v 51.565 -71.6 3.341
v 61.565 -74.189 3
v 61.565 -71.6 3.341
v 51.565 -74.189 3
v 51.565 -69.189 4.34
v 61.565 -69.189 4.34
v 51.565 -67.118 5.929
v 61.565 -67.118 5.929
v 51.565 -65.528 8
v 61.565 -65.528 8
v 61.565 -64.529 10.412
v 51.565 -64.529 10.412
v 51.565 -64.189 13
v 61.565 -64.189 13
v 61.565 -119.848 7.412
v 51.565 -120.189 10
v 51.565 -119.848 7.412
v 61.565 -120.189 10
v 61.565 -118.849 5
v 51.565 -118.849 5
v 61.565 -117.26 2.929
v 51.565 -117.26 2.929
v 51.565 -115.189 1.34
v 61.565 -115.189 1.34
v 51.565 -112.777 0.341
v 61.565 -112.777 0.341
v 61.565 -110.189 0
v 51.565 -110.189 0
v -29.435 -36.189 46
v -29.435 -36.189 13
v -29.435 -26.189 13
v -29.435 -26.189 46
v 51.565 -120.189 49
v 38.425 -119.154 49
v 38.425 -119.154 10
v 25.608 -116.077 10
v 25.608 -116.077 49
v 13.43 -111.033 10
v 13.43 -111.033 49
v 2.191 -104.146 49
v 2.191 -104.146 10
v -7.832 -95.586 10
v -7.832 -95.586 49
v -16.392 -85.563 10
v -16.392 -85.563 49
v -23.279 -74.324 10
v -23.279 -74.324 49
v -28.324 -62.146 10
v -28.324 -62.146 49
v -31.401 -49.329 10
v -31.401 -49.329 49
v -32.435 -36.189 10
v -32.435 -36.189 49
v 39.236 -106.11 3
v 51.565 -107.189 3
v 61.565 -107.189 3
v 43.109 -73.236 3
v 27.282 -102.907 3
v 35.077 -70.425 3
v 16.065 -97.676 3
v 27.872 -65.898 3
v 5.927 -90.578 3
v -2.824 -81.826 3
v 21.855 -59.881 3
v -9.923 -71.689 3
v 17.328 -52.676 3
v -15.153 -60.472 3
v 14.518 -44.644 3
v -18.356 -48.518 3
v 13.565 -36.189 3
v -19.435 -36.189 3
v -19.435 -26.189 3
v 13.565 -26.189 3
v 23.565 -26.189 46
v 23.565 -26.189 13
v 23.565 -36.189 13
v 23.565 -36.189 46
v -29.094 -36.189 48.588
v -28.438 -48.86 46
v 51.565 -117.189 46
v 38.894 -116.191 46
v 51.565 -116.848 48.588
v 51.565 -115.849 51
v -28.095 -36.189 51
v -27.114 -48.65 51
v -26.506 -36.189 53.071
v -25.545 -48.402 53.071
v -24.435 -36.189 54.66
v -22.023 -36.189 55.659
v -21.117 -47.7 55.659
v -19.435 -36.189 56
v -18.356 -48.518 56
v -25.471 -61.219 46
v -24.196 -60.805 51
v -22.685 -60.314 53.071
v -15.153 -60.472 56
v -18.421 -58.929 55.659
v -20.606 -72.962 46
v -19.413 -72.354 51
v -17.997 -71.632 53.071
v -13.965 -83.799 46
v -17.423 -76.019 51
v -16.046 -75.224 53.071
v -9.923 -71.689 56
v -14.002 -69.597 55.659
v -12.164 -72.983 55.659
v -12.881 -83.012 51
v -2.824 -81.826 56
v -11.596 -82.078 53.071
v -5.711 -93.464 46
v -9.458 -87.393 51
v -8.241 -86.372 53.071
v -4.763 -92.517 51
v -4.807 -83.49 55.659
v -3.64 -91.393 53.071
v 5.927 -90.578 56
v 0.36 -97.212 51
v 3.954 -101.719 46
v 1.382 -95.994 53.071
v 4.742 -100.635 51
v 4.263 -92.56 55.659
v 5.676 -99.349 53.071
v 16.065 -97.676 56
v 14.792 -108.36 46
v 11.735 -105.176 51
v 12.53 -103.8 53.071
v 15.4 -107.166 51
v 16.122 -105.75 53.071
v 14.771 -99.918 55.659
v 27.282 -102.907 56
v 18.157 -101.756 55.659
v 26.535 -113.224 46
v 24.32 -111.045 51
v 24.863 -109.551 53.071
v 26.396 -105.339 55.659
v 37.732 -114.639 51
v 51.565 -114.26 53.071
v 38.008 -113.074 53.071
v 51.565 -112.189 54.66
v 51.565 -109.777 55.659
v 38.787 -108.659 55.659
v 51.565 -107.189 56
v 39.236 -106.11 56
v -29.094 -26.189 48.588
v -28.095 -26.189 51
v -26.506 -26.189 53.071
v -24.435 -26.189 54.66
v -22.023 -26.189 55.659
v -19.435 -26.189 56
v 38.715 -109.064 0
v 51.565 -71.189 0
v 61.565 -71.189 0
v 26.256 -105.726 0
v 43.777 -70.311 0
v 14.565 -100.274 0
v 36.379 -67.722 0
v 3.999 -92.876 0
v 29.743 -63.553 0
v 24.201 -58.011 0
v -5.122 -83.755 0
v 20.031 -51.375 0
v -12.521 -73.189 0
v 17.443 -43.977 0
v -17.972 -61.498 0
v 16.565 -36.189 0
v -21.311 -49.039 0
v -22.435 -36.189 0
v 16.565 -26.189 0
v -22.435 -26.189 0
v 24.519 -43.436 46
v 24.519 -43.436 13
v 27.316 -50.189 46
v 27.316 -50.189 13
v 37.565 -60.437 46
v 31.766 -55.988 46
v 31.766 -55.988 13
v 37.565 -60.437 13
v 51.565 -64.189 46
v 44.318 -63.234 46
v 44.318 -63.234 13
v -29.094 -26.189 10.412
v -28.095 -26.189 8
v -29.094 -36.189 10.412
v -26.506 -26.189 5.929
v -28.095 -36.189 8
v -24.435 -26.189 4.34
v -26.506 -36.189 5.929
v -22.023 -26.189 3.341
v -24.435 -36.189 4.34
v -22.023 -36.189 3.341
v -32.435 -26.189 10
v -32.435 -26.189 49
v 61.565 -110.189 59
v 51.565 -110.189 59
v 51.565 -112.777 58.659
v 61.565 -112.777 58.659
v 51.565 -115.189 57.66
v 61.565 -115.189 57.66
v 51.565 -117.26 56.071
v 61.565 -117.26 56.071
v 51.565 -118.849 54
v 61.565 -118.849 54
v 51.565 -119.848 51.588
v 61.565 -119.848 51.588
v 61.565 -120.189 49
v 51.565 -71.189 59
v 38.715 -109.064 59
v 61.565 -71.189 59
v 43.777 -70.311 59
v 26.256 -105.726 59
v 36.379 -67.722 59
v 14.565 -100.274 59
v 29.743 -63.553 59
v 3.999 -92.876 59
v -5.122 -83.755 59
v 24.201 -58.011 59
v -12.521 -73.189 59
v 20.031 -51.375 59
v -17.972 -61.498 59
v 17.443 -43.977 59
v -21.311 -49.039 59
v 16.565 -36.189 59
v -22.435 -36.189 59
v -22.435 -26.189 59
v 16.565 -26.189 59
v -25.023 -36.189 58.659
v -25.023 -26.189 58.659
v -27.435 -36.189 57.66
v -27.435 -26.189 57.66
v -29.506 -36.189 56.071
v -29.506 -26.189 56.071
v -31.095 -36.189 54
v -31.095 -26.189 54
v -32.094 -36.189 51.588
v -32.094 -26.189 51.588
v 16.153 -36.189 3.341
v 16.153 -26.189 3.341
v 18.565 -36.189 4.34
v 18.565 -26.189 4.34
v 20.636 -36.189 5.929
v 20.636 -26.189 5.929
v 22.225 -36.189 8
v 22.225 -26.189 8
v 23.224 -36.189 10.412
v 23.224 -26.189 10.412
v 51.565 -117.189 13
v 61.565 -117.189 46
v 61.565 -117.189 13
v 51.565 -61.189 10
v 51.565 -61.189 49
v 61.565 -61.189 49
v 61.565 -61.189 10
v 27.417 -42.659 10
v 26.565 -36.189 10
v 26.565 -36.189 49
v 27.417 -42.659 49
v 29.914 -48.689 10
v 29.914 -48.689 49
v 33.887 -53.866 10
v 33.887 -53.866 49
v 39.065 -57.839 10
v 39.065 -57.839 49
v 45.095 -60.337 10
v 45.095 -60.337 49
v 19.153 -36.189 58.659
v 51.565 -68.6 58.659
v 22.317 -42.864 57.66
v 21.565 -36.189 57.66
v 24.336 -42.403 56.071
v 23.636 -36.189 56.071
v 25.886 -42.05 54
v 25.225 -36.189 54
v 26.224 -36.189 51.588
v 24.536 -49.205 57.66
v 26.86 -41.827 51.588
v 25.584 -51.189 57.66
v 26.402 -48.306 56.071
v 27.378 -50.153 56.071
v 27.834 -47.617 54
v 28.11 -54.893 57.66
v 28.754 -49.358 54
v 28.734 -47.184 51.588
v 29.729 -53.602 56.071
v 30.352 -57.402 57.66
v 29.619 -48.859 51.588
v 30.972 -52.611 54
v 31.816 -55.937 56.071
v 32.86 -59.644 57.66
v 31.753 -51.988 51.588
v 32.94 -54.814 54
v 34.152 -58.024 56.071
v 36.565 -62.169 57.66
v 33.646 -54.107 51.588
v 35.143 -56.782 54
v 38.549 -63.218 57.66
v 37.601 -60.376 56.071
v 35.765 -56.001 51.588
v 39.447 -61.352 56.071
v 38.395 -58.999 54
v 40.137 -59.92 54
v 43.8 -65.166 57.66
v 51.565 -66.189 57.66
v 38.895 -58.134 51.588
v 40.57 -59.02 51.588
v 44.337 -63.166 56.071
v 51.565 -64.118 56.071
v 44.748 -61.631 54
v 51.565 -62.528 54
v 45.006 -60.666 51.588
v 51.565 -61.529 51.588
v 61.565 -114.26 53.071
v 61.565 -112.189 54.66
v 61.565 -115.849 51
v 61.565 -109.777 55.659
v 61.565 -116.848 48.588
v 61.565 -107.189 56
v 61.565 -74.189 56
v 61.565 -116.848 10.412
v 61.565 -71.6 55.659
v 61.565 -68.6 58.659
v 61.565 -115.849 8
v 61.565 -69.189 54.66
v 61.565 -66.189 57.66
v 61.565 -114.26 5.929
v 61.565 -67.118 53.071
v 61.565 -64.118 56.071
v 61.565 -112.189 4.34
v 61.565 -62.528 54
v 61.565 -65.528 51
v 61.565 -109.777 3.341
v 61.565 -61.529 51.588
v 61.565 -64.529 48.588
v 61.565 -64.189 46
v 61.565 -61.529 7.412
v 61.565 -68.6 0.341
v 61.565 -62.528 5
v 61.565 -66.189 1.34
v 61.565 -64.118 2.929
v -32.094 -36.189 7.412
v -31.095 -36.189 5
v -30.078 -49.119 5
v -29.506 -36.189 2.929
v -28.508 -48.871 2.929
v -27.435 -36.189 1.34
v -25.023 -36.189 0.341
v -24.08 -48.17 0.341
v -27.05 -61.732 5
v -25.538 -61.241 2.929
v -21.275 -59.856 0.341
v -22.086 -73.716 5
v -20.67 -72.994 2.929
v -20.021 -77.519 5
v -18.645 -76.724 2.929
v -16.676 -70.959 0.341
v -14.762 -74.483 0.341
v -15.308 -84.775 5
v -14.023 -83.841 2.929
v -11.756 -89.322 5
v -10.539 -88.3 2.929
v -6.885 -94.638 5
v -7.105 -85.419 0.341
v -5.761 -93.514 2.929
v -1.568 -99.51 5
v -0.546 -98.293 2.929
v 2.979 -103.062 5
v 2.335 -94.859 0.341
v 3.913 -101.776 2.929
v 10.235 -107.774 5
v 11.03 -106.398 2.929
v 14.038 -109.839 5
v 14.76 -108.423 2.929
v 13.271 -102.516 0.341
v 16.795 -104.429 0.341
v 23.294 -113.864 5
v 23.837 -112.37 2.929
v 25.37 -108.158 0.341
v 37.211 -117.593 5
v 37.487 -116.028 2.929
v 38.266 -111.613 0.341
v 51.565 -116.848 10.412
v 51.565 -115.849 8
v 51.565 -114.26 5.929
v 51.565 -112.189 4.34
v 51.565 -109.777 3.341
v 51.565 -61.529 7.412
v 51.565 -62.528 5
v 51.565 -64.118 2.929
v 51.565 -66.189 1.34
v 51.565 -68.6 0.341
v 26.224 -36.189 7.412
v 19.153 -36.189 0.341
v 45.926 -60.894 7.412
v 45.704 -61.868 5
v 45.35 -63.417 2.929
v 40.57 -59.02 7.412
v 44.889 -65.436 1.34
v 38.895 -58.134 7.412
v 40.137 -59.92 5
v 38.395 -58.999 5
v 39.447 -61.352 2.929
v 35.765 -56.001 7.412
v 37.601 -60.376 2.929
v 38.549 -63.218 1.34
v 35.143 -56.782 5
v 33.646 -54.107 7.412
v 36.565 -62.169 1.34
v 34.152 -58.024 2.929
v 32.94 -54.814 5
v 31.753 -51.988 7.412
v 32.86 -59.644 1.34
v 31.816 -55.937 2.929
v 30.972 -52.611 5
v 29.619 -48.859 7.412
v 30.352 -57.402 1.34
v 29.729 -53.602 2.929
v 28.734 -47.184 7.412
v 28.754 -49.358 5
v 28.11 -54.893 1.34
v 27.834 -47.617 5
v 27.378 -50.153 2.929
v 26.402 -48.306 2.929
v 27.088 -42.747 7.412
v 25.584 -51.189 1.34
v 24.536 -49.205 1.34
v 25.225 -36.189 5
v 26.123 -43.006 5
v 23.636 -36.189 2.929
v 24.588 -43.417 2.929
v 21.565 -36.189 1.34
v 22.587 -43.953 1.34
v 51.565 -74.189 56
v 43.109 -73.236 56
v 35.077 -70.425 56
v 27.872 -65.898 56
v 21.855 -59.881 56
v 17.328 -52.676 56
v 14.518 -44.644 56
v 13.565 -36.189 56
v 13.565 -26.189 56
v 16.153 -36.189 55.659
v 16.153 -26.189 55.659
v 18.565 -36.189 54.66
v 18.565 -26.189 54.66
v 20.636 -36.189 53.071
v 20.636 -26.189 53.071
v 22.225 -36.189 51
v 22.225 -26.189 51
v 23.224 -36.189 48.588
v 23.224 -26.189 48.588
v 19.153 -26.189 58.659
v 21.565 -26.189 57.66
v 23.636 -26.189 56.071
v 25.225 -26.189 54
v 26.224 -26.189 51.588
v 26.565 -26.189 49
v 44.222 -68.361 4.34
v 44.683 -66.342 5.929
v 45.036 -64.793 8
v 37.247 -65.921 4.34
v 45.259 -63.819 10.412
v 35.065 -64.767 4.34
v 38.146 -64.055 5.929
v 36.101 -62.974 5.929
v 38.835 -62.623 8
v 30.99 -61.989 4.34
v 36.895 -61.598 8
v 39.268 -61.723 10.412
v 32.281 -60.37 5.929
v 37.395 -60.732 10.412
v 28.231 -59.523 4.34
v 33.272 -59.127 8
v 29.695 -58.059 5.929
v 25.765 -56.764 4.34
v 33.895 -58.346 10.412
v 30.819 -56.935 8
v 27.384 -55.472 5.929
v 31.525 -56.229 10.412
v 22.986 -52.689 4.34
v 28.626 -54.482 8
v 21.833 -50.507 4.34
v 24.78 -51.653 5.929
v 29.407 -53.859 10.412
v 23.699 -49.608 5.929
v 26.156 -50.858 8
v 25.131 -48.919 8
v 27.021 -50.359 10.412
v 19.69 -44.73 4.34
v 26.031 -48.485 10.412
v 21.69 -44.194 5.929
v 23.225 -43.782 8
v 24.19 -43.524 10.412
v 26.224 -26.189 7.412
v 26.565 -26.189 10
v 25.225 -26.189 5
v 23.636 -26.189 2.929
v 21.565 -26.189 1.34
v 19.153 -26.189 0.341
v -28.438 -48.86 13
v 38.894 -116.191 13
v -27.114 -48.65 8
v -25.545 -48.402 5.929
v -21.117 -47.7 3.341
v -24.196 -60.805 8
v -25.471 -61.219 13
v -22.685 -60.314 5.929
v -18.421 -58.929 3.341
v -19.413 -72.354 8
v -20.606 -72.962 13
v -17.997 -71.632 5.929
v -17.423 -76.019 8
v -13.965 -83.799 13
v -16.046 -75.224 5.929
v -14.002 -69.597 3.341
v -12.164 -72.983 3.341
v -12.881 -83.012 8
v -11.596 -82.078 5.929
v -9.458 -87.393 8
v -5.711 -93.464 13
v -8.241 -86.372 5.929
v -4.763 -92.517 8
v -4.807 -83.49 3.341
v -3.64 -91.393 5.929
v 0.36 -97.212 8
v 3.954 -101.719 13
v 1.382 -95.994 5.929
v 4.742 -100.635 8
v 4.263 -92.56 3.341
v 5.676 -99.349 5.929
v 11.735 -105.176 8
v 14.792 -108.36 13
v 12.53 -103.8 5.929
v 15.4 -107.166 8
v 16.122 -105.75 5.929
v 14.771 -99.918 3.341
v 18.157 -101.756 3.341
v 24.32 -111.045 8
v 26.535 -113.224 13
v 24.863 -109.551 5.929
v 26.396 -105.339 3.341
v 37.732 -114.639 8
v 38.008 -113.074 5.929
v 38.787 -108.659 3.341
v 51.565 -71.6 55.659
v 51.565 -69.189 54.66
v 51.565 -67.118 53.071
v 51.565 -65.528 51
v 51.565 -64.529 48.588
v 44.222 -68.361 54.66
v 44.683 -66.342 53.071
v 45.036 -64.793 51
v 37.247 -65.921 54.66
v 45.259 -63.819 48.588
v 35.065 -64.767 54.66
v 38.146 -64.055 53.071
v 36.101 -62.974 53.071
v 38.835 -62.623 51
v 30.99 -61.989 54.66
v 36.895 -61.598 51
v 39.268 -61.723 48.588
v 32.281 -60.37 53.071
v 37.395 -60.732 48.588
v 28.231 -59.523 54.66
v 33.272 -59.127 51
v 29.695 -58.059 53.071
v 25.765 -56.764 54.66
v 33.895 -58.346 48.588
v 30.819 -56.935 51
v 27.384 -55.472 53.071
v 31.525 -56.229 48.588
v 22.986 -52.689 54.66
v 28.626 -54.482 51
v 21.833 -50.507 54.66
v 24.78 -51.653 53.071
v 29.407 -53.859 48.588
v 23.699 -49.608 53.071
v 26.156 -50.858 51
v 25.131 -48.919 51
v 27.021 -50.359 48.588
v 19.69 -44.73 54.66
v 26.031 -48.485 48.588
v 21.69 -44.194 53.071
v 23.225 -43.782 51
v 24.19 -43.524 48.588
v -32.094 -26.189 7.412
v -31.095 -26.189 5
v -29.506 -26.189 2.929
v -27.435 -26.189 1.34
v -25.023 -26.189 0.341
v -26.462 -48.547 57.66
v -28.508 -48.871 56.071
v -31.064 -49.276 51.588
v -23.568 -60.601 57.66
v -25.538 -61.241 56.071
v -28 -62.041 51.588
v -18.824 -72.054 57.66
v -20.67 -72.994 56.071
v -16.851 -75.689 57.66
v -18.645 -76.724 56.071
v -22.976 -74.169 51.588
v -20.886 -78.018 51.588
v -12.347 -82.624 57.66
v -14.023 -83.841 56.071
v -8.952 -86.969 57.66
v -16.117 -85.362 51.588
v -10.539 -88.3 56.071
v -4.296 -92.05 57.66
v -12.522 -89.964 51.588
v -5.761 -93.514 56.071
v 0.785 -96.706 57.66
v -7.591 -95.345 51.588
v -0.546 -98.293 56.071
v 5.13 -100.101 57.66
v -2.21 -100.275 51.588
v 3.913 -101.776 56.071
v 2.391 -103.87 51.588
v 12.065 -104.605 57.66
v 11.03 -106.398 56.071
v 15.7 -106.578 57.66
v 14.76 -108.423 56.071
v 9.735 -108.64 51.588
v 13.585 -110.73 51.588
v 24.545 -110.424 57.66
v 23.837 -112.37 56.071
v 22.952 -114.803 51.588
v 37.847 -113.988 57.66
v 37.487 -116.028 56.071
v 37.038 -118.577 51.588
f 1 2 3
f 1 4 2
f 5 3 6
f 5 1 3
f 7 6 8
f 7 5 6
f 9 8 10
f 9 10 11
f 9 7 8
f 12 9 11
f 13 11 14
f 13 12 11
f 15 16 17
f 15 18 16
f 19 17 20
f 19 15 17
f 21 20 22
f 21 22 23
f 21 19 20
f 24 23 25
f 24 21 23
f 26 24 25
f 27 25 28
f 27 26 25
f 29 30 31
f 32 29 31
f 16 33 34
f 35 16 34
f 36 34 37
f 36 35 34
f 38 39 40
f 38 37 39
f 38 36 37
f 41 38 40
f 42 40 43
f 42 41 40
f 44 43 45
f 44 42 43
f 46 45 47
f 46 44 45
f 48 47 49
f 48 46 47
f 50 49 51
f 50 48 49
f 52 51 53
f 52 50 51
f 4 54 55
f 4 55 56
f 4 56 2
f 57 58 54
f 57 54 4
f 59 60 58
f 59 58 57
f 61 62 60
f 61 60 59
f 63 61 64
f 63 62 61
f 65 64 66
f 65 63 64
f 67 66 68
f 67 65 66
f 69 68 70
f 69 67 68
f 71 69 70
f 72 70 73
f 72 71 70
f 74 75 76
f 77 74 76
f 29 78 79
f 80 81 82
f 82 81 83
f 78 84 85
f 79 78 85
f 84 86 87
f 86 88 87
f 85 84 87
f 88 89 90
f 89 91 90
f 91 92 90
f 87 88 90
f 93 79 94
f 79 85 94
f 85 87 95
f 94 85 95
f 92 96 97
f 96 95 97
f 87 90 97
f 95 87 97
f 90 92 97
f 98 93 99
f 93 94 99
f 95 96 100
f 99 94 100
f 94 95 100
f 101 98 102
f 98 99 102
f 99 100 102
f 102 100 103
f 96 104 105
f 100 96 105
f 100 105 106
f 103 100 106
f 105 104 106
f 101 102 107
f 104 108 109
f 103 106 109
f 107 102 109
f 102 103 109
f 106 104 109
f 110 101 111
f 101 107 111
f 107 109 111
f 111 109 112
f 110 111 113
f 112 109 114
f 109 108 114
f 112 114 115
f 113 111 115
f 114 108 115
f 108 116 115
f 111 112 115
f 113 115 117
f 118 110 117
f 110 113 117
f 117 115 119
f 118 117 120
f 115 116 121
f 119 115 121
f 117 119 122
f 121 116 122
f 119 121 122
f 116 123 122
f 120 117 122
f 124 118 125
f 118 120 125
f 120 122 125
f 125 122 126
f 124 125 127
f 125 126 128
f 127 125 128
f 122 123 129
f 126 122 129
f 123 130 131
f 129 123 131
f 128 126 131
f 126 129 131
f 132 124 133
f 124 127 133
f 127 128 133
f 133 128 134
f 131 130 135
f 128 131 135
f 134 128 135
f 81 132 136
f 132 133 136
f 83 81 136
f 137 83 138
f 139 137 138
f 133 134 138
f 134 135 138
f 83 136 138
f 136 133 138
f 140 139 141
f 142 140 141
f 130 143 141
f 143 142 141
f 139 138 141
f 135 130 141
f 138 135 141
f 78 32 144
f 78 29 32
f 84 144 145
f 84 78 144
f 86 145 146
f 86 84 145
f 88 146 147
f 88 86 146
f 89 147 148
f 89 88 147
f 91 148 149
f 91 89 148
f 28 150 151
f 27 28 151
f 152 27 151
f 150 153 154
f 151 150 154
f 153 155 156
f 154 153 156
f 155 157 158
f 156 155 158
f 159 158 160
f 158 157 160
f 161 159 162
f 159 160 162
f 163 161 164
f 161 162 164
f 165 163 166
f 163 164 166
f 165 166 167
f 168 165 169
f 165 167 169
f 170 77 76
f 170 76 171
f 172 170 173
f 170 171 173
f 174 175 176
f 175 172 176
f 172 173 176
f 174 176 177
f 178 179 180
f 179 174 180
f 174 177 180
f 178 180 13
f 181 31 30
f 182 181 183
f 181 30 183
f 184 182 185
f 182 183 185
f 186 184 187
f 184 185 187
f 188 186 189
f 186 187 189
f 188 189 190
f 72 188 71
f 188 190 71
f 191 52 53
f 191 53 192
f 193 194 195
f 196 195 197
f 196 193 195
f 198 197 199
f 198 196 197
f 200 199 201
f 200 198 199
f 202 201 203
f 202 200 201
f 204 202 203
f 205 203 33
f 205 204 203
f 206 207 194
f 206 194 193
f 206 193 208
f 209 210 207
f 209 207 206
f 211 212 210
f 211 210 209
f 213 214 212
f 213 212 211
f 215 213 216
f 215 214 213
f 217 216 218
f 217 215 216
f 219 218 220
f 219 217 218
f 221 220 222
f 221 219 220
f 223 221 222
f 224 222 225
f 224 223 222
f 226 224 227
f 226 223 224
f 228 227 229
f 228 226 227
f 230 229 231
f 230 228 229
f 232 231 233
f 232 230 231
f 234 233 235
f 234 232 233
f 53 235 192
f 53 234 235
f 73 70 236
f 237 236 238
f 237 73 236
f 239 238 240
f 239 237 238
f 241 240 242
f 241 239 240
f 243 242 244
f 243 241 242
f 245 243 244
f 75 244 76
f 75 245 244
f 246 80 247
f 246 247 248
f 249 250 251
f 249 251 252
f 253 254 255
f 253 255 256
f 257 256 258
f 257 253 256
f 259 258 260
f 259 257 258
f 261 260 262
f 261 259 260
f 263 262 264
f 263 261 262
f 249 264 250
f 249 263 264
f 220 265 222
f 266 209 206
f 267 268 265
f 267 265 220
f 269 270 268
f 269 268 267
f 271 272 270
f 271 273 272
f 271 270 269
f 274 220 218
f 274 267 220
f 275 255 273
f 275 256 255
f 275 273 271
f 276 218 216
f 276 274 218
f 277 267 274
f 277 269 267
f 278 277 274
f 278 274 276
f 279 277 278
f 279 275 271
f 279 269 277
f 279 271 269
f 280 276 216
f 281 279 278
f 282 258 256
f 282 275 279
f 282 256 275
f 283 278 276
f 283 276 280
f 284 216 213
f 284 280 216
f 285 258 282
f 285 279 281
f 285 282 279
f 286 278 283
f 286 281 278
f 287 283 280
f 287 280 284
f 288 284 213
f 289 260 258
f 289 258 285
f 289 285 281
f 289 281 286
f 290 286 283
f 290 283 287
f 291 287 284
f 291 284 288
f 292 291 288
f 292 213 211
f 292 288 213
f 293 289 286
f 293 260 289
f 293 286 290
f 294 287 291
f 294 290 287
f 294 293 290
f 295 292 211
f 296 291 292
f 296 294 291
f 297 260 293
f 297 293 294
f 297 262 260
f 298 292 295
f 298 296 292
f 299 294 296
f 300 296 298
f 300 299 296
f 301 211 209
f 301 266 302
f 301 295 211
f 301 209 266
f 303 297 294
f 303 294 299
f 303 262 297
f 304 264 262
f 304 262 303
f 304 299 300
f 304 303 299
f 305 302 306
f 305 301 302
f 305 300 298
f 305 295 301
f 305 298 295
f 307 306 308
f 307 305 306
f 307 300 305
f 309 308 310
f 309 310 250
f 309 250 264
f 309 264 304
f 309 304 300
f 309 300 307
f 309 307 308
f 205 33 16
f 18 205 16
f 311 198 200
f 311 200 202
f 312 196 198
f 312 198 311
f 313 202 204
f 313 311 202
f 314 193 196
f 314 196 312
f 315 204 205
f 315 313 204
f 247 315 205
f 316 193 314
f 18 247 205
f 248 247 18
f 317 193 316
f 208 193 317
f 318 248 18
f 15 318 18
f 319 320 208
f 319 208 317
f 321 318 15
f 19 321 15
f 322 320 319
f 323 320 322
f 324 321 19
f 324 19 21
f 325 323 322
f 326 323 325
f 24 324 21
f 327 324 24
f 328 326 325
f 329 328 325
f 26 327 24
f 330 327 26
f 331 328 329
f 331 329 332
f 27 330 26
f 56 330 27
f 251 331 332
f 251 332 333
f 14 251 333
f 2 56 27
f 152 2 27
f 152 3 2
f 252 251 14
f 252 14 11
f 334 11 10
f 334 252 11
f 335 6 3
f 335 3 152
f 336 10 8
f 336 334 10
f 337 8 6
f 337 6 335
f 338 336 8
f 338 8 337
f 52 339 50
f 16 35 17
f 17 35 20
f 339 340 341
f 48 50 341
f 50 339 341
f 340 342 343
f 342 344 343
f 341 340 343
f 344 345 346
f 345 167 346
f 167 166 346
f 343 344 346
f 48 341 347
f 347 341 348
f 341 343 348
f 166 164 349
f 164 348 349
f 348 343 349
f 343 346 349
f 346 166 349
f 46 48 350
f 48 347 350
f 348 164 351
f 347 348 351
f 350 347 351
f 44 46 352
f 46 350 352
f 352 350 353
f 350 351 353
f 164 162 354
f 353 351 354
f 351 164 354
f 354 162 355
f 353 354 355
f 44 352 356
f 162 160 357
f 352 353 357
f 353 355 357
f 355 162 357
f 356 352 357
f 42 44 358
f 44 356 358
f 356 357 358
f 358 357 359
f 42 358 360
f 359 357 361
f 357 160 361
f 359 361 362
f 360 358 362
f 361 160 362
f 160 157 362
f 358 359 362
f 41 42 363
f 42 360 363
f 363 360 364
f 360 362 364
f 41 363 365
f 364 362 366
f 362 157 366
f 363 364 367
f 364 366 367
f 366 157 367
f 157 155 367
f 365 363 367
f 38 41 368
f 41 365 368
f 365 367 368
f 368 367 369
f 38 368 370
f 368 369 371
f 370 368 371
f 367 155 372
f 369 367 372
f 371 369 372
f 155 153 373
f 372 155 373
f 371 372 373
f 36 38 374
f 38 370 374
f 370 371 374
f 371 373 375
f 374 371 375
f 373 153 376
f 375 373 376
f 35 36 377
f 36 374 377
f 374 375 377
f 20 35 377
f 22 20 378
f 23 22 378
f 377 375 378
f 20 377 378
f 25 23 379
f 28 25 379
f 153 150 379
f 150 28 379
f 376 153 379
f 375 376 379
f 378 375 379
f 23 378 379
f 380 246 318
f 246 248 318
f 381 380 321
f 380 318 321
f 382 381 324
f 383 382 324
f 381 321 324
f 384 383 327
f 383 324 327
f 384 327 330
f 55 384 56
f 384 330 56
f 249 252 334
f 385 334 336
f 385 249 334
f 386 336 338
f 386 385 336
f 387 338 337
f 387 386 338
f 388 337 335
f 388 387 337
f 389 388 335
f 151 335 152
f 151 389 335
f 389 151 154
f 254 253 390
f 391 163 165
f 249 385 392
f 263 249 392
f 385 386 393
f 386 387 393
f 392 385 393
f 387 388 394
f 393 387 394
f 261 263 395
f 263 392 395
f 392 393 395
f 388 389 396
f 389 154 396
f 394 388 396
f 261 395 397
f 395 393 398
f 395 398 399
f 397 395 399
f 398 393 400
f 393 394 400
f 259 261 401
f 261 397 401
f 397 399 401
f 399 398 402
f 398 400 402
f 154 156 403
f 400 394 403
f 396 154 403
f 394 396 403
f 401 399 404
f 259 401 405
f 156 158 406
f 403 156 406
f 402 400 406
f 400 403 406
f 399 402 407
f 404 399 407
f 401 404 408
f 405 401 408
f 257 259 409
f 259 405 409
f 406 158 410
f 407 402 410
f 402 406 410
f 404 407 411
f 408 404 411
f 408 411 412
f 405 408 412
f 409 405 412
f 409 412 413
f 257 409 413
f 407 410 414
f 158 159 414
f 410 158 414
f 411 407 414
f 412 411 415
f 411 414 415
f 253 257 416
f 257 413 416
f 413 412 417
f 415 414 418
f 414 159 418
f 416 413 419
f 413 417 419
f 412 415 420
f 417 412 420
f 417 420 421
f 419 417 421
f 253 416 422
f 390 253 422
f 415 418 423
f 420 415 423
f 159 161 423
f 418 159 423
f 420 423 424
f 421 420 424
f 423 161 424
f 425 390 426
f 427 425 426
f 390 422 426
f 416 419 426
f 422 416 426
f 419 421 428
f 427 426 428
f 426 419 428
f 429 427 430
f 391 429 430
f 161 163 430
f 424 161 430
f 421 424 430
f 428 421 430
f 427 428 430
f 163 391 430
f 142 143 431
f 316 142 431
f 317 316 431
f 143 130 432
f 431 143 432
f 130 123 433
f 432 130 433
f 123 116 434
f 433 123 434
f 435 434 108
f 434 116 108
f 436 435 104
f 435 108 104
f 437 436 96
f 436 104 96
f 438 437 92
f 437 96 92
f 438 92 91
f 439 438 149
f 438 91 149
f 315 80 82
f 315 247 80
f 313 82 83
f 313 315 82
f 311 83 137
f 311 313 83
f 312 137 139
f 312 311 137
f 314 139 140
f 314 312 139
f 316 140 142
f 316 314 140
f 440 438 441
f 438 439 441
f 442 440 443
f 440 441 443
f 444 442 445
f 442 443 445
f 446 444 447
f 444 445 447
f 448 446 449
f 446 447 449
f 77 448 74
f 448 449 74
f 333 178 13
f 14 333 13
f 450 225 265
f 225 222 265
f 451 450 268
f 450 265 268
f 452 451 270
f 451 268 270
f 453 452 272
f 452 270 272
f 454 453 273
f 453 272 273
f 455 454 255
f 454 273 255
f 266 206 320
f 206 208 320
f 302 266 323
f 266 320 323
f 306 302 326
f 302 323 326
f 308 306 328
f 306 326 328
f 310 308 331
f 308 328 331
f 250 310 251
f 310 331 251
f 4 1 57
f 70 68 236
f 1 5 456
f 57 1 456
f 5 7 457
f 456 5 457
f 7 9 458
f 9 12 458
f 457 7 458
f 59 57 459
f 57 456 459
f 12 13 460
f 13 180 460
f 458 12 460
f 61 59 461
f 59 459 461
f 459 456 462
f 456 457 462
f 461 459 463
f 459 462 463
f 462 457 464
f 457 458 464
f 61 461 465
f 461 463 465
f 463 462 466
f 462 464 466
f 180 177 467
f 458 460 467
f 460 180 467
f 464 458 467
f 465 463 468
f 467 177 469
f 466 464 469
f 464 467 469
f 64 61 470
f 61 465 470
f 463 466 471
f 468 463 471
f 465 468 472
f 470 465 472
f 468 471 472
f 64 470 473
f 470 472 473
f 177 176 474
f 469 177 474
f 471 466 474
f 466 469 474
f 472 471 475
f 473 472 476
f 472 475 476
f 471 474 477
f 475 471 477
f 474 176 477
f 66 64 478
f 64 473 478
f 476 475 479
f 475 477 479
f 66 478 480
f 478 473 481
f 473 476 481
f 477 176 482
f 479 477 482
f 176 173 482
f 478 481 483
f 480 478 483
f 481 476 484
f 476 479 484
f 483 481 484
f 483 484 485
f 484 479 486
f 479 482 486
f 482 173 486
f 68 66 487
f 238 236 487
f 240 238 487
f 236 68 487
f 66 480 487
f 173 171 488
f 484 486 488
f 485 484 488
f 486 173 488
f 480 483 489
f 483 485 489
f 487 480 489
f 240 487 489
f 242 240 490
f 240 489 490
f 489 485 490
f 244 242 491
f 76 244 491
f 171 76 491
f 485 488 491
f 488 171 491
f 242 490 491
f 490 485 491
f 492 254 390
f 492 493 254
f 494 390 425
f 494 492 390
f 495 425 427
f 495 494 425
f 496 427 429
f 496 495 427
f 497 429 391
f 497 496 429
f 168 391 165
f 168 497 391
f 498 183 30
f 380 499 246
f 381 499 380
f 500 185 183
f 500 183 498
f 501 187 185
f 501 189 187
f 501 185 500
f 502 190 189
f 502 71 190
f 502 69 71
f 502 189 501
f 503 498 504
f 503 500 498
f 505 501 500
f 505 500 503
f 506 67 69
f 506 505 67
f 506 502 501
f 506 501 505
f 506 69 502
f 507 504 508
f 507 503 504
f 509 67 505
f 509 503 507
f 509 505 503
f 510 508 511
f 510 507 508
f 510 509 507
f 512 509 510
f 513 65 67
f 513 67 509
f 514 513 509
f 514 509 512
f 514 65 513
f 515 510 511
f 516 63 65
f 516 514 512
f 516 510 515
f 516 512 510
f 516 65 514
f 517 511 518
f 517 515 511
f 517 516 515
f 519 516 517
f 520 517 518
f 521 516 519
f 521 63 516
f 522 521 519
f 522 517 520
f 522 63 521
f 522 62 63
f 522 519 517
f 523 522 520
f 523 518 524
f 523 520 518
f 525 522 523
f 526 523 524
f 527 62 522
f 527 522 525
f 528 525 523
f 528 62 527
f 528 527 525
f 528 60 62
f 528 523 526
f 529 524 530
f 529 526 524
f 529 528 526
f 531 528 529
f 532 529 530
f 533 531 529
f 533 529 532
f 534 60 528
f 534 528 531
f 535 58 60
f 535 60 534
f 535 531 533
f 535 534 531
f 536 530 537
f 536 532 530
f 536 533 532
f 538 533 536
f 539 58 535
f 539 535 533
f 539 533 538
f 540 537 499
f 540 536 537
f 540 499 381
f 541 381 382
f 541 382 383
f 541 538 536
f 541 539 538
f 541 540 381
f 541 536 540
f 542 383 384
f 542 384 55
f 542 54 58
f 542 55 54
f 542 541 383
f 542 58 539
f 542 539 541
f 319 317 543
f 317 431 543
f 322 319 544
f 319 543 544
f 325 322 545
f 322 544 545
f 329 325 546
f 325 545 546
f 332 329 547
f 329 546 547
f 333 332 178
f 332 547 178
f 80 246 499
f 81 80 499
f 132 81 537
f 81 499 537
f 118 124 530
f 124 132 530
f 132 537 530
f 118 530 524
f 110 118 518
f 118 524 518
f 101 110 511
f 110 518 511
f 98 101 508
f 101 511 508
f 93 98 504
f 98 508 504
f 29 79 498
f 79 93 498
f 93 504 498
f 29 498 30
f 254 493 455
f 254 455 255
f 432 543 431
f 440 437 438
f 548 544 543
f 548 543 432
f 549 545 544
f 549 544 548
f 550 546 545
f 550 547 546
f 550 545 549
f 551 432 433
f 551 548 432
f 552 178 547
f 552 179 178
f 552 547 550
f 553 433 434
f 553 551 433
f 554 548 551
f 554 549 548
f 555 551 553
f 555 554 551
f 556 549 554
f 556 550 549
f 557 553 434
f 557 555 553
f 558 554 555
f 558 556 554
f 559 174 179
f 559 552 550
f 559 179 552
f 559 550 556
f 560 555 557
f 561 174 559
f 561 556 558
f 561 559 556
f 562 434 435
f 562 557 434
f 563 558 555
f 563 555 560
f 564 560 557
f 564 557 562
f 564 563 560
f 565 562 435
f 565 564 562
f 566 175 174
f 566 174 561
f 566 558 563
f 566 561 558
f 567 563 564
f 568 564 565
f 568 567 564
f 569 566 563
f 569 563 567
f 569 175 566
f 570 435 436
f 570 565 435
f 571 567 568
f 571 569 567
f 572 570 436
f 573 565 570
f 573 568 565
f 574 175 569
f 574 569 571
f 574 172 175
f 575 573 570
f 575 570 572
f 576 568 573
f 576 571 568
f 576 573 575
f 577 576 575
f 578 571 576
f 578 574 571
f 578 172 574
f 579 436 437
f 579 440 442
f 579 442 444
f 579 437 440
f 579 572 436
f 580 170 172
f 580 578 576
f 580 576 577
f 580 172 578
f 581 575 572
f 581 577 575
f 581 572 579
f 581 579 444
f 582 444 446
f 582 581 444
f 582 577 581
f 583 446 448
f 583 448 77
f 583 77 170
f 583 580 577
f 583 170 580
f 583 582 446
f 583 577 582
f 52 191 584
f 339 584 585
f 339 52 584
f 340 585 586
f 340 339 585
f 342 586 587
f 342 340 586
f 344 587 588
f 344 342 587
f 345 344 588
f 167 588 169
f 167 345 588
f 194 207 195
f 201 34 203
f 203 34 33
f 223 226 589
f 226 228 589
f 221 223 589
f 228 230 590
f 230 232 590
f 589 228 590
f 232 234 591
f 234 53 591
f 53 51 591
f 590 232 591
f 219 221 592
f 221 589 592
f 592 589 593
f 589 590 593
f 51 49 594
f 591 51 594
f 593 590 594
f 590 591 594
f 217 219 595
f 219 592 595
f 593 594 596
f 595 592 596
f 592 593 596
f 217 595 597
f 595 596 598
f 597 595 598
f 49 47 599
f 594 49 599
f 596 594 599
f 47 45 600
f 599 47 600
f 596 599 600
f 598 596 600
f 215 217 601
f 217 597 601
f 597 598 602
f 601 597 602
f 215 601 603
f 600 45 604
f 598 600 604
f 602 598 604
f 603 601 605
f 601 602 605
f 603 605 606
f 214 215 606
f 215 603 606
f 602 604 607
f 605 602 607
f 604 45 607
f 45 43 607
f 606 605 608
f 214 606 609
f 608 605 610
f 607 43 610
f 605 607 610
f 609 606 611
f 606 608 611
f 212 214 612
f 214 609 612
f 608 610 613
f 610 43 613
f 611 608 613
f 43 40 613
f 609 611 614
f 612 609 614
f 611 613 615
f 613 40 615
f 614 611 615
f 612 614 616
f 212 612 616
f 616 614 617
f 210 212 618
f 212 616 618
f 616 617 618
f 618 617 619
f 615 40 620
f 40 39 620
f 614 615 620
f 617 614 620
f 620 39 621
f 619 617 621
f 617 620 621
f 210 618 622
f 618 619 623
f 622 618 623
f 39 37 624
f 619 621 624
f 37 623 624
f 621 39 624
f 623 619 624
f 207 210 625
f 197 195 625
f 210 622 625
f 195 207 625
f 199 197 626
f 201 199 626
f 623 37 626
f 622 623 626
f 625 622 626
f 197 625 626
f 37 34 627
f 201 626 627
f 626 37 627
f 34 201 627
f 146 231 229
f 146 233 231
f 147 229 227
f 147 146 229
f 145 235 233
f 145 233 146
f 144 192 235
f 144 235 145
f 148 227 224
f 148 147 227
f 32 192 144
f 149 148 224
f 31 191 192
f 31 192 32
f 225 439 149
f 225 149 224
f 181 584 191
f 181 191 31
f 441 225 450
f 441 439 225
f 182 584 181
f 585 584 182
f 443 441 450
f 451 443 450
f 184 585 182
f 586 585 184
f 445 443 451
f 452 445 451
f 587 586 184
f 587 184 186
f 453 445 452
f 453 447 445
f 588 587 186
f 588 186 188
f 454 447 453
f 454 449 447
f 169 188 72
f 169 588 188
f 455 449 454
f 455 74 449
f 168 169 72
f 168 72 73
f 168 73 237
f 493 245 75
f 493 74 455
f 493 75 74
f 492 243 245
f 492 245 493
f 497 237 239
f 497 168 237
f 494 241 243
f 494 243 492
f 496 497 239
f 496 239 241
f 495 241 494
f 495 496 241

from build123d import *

# Parameters (mm, degrees)
BOSS_EXTRUDE3_DEPTH = 59
SKETCH4_W           = 59
SKETCH4_H           = 59
BOSS_EXTRUDE4_DEPTH = 100
SHELL2_T            = -3
SKETCH5_W           = 59
SKETCH5_H           = 59
CUT_EXTRUDE1_DEPTH  = 100
FILLET1_R           = 10


with BuildPart() as part:
    # Sketch3 → Boss-Extrude3 (new body)
    with BuildSketch(Plane.XY):
        with BuildLine():
            Line((-32.434933876, -26.188574195), (26.565066124, -26.188574195))
            Line((26.565066124, -26.188574195), (26.565066124, -36.188574195))
            ThreePointArc((26.565066124, -36.188574195), (33.887396594, -53.866243725), (51.565066124, -61.188574195))
            Line((51.565066124, -61.188574195), (61.565066124, -61.188574195))
            Line((61.565066124, -61.188574195), (61.565066124, -120.188574195))
            Line((61.565066124, -120.188574195), (51.565066124, -120.188574195))
            ThreePointArc((51.565066124, -120.188574195), (-7.831903496, -95.585543815), (-32.434933876, -36.188574195))
            Line((-32.434933876, -36.188574195), (-32.434933876, -26.188574195))
        make_face()
    extrude(amount=BOSS_EXTRUDE3_DEPTH)

    # Sketch4 → Boss-Extrude4 (add)
    with BuildSketch(Plane(origin=(61.565066124, 0, 0), x_dir=(0, 0, -1), z_dir=(1, 0, 0))):
        with Locations((-29.5, -90.688574195)):
            Rectangle(SKETCH4_W, SKETCH4_H)
    extrude(amount=BOSS_EXTRUDE4_DEPTH)

    # Shell2
    shell2_openings = [part.faces().sort_by_distance(p)[0] for p in [
        (-2.934933876, -26.188574195, 29.5),
    ]]
    offset(amount=SHELL2_T, openings=shell2_openings, kind=Kind.INTERSECTION)

    # Sketch5 → Cut-Extrude1 (cut)
    with BuildSketch(Plane(origin=(161.565066124, 0, 0), x_dir=(0, 0, -1), z_dir=(1, 0, 0))):
        with Locations((-29.5, -90.688574195)):
            Rectangle(SKETCH5_W, SKETCH5_H)
    extrude(amount=-CUT_EXTRUDE1_DEPTH, mode=Mode.SUBTRACT)

    # Fillet1
    fillet1_edges = [part.edges().sort_by_distance(p)[0] for p in [
        (56.565066124, -120.188574195, 0),
        (-7.831903496, -95.585543815, 0),
        (-32.434933876, -31.188574195, 0),
        (56.565066124, -120.188574195, 59),
        (33.887396594, -53.866243725, 59),
        (26.565066124, -31.188574195, 59),
        (-29.434933876, -31.188574195, 3),
        (-5.710583152, -93.464223471, 3),
        (56.565066124, -117.188574195, 3),
        (31.76607625, -55.987564069, 3),
        (23.565066124, -31.188574195, 3),
        (-29.434933876, -31.188574195, 56),
        (-5.710583152, -93.464223471, 56),
        (56.565066124, -117.188574195, 56),
        (31.76607625, -55.987564069, 56),
        (23.565066124, -31.188574195, 56),
        (-32.434933876, -31.188574195, 59),
        (56.565066124, -64.188574195, 3),
        (56.565066124, -64.188574195, 56),
        (56.565066124, -61.188574195, 0),
        (56.565066124, -61.188574195, 59),
        (-7.831903496, -95.585543815, 59),
        (26.565066124, -31.188574195, 0),
        (33.887396594, -53.866243725, 0),
    ]]
    fillet(fillet1_edges, radius=FILLET1_R)


solid = part.part
